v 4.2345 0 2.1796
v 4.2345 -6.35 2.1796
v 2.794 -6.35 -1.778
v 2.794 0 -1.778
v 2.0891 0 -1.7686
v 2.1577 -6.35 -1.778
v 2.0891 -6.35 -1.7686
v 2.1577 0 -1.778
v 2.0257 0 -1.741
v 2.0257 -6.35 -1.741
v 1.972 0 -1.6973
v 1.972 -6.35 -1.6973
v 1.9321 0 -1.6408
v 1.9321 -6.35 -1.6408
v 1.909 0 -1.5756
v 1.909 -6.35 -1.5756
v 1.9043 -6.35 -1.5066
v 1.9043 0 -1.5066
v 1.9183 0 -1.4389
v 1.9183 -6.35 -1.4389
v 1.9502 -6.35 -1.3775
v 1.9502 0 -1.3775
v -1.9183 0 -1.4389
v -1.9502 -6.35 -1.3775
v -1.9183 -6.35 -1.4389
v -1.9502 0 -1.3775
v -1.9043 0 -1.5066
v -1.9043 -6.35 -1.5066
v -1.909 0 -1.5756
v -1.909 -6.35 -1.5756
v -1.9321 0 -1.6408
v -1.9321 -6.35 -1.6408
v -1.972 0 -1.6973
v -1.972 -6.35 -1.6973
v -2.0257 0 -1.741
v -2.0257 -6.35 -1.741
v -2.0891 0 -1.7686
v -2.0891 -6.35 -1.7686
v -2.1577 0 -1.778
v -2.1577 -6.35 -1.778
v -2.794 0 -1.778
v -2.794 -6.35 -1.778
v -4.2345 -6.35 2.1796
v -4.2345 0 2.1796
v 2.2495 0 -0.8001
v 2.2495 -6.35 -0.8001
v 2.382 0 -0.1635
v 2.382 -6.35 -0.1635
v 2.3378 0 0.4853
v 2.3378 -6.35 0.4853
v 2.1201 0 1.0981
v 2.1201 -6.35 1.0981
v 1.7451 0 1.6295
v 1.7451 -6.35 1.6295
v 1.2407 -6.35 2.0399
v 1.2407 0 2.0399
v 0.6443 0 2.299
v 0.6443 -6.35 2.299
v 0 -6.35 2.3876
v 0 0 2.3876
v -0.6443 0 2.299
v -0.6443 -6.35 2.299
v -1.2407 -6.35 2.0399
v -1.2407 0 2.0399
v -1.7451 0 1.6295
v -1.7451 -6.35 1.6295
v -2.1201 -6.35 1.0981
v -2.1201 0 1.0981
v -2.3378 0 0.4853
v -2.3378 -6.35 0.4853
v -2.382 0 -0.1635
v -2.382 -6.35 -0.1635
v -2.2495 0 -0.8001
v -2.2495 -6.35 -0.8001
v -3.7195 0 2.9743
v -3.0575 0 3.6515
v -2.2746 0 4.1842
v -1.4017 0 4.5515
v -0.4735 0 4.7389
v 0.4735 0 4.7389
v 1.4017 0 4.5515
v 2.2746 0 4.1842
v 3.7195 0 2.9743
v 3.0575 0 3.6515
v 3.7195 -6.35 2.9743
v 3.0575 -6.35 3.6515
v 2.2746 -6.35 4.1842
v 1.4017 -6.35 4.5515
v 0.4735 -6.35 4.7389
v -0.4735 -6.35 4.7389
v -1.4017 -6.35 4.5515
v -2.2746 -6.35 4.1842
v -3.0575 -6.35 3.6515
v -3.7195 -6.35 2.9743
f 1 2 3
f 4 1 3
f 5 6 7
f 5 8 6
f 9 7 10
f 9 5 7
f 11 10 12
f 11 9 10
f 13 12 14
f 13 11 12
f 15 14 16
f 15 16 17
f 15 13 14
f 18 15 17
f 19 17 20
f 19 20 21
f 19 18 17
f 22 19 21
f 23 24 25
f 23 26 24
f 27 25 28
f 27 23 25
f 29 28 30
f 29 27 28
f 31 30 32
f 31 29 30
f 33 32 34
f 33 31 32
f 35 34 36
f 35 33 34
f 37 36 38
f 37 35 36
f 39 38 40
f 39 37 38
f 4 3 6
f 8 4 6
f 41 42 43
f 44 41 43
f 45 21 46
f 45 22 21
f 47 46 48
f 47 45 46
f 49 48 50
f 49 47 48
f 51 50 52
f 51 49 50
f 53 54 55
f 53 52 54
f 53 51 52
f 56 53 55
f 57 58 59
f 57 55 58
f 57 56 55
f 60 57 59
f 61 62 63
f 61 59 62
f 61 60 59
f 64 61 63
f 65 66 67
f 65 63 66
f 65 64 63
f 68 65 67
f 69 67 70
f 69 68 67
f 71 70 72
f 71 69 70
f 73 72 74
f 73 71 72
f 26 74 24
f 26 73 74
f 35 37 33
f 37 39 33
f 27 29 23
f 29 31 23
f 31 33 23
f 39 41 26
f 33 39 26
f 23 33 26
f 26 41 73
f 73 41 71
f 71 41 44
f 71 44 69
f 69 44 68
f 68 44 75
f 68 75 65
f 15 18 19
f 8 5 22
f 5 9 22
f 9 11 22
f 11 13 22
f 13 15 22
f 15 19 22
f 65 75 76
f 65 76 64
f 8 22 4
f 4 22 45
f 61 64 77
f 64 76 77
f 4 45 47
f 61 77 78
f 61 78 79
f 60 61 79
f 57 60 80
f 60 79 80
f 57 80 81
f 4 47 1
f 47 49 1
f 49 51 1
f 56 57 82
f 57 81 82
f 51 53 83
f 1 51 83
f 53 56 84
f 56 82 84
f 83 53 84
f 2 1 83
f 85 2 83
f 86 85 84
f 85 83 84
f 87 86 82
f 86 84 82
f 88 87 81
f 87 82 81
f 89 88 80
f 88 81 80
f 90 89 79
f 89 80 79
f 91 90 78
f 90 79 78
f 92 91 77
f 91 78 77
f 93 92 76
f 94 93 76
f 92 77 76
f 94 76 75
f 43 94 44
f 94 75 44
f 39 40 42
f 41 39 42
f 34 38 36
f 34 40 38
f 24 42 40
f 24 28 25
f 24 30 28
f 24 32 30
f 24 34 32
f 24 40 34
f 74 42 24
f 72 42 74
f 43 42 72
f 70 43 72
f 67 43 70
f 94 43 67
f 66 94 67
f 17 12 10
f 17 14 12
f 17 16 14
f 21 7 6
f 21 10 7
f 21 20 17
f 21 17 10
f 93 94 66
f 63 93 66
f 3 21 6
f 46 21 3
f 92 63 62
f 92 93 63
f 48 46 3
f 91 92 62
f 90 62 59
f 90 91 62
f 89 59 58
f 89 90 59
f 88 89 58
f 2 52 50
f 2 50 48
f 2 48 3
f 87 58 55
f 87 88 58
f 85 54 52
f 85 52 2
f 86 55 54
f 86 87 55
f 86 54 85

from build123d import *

# Parameters (mm, degrees)
F0_R     = 4.7625
F0_R_2   = 2.3876
F1_DEPTH = 6.35
F3_DEPTH = 6.351
F4_R     = 0.254


with BuildPart() as f1:
    # F0 (on Front) → F1 (new body)
    with BuildSketch(Plane.XZ):
        Circle(F0_R)
        Circle(F0_R_2, mode=Mode.SUBTRACT)
    extrude(amount=F1_DEPTH)

    # F2 (on face) → F3 (cut, through all)
    with BuildSketch(Plane.XZ.offset(6.35)):
        Polygon((-2.794, -1.778), (-4.8590770571, 3.8957525837), (-7.3392285321, 3.8957525837), (-7.3392285321, -6.9893564564), (6.3704967257, -6.9893564564), (6.3704967257, 4.2867070974), (5.001372863, 4.2867070974), (2.794, -1.778), align=None)
    extrude(amount=-F3_DEPTH, mode=Mode.SUBTRACT)

    # F4
    f4_edges = [f1.edges().sort_by_distance(p)[0] for p in [
        (-1.593534, -3.175, -1.778),
        (1.593534, -3.175, -1.778),
    ]]
    fillet(f4_edges, radius=F4_R)


solid = f1.part
